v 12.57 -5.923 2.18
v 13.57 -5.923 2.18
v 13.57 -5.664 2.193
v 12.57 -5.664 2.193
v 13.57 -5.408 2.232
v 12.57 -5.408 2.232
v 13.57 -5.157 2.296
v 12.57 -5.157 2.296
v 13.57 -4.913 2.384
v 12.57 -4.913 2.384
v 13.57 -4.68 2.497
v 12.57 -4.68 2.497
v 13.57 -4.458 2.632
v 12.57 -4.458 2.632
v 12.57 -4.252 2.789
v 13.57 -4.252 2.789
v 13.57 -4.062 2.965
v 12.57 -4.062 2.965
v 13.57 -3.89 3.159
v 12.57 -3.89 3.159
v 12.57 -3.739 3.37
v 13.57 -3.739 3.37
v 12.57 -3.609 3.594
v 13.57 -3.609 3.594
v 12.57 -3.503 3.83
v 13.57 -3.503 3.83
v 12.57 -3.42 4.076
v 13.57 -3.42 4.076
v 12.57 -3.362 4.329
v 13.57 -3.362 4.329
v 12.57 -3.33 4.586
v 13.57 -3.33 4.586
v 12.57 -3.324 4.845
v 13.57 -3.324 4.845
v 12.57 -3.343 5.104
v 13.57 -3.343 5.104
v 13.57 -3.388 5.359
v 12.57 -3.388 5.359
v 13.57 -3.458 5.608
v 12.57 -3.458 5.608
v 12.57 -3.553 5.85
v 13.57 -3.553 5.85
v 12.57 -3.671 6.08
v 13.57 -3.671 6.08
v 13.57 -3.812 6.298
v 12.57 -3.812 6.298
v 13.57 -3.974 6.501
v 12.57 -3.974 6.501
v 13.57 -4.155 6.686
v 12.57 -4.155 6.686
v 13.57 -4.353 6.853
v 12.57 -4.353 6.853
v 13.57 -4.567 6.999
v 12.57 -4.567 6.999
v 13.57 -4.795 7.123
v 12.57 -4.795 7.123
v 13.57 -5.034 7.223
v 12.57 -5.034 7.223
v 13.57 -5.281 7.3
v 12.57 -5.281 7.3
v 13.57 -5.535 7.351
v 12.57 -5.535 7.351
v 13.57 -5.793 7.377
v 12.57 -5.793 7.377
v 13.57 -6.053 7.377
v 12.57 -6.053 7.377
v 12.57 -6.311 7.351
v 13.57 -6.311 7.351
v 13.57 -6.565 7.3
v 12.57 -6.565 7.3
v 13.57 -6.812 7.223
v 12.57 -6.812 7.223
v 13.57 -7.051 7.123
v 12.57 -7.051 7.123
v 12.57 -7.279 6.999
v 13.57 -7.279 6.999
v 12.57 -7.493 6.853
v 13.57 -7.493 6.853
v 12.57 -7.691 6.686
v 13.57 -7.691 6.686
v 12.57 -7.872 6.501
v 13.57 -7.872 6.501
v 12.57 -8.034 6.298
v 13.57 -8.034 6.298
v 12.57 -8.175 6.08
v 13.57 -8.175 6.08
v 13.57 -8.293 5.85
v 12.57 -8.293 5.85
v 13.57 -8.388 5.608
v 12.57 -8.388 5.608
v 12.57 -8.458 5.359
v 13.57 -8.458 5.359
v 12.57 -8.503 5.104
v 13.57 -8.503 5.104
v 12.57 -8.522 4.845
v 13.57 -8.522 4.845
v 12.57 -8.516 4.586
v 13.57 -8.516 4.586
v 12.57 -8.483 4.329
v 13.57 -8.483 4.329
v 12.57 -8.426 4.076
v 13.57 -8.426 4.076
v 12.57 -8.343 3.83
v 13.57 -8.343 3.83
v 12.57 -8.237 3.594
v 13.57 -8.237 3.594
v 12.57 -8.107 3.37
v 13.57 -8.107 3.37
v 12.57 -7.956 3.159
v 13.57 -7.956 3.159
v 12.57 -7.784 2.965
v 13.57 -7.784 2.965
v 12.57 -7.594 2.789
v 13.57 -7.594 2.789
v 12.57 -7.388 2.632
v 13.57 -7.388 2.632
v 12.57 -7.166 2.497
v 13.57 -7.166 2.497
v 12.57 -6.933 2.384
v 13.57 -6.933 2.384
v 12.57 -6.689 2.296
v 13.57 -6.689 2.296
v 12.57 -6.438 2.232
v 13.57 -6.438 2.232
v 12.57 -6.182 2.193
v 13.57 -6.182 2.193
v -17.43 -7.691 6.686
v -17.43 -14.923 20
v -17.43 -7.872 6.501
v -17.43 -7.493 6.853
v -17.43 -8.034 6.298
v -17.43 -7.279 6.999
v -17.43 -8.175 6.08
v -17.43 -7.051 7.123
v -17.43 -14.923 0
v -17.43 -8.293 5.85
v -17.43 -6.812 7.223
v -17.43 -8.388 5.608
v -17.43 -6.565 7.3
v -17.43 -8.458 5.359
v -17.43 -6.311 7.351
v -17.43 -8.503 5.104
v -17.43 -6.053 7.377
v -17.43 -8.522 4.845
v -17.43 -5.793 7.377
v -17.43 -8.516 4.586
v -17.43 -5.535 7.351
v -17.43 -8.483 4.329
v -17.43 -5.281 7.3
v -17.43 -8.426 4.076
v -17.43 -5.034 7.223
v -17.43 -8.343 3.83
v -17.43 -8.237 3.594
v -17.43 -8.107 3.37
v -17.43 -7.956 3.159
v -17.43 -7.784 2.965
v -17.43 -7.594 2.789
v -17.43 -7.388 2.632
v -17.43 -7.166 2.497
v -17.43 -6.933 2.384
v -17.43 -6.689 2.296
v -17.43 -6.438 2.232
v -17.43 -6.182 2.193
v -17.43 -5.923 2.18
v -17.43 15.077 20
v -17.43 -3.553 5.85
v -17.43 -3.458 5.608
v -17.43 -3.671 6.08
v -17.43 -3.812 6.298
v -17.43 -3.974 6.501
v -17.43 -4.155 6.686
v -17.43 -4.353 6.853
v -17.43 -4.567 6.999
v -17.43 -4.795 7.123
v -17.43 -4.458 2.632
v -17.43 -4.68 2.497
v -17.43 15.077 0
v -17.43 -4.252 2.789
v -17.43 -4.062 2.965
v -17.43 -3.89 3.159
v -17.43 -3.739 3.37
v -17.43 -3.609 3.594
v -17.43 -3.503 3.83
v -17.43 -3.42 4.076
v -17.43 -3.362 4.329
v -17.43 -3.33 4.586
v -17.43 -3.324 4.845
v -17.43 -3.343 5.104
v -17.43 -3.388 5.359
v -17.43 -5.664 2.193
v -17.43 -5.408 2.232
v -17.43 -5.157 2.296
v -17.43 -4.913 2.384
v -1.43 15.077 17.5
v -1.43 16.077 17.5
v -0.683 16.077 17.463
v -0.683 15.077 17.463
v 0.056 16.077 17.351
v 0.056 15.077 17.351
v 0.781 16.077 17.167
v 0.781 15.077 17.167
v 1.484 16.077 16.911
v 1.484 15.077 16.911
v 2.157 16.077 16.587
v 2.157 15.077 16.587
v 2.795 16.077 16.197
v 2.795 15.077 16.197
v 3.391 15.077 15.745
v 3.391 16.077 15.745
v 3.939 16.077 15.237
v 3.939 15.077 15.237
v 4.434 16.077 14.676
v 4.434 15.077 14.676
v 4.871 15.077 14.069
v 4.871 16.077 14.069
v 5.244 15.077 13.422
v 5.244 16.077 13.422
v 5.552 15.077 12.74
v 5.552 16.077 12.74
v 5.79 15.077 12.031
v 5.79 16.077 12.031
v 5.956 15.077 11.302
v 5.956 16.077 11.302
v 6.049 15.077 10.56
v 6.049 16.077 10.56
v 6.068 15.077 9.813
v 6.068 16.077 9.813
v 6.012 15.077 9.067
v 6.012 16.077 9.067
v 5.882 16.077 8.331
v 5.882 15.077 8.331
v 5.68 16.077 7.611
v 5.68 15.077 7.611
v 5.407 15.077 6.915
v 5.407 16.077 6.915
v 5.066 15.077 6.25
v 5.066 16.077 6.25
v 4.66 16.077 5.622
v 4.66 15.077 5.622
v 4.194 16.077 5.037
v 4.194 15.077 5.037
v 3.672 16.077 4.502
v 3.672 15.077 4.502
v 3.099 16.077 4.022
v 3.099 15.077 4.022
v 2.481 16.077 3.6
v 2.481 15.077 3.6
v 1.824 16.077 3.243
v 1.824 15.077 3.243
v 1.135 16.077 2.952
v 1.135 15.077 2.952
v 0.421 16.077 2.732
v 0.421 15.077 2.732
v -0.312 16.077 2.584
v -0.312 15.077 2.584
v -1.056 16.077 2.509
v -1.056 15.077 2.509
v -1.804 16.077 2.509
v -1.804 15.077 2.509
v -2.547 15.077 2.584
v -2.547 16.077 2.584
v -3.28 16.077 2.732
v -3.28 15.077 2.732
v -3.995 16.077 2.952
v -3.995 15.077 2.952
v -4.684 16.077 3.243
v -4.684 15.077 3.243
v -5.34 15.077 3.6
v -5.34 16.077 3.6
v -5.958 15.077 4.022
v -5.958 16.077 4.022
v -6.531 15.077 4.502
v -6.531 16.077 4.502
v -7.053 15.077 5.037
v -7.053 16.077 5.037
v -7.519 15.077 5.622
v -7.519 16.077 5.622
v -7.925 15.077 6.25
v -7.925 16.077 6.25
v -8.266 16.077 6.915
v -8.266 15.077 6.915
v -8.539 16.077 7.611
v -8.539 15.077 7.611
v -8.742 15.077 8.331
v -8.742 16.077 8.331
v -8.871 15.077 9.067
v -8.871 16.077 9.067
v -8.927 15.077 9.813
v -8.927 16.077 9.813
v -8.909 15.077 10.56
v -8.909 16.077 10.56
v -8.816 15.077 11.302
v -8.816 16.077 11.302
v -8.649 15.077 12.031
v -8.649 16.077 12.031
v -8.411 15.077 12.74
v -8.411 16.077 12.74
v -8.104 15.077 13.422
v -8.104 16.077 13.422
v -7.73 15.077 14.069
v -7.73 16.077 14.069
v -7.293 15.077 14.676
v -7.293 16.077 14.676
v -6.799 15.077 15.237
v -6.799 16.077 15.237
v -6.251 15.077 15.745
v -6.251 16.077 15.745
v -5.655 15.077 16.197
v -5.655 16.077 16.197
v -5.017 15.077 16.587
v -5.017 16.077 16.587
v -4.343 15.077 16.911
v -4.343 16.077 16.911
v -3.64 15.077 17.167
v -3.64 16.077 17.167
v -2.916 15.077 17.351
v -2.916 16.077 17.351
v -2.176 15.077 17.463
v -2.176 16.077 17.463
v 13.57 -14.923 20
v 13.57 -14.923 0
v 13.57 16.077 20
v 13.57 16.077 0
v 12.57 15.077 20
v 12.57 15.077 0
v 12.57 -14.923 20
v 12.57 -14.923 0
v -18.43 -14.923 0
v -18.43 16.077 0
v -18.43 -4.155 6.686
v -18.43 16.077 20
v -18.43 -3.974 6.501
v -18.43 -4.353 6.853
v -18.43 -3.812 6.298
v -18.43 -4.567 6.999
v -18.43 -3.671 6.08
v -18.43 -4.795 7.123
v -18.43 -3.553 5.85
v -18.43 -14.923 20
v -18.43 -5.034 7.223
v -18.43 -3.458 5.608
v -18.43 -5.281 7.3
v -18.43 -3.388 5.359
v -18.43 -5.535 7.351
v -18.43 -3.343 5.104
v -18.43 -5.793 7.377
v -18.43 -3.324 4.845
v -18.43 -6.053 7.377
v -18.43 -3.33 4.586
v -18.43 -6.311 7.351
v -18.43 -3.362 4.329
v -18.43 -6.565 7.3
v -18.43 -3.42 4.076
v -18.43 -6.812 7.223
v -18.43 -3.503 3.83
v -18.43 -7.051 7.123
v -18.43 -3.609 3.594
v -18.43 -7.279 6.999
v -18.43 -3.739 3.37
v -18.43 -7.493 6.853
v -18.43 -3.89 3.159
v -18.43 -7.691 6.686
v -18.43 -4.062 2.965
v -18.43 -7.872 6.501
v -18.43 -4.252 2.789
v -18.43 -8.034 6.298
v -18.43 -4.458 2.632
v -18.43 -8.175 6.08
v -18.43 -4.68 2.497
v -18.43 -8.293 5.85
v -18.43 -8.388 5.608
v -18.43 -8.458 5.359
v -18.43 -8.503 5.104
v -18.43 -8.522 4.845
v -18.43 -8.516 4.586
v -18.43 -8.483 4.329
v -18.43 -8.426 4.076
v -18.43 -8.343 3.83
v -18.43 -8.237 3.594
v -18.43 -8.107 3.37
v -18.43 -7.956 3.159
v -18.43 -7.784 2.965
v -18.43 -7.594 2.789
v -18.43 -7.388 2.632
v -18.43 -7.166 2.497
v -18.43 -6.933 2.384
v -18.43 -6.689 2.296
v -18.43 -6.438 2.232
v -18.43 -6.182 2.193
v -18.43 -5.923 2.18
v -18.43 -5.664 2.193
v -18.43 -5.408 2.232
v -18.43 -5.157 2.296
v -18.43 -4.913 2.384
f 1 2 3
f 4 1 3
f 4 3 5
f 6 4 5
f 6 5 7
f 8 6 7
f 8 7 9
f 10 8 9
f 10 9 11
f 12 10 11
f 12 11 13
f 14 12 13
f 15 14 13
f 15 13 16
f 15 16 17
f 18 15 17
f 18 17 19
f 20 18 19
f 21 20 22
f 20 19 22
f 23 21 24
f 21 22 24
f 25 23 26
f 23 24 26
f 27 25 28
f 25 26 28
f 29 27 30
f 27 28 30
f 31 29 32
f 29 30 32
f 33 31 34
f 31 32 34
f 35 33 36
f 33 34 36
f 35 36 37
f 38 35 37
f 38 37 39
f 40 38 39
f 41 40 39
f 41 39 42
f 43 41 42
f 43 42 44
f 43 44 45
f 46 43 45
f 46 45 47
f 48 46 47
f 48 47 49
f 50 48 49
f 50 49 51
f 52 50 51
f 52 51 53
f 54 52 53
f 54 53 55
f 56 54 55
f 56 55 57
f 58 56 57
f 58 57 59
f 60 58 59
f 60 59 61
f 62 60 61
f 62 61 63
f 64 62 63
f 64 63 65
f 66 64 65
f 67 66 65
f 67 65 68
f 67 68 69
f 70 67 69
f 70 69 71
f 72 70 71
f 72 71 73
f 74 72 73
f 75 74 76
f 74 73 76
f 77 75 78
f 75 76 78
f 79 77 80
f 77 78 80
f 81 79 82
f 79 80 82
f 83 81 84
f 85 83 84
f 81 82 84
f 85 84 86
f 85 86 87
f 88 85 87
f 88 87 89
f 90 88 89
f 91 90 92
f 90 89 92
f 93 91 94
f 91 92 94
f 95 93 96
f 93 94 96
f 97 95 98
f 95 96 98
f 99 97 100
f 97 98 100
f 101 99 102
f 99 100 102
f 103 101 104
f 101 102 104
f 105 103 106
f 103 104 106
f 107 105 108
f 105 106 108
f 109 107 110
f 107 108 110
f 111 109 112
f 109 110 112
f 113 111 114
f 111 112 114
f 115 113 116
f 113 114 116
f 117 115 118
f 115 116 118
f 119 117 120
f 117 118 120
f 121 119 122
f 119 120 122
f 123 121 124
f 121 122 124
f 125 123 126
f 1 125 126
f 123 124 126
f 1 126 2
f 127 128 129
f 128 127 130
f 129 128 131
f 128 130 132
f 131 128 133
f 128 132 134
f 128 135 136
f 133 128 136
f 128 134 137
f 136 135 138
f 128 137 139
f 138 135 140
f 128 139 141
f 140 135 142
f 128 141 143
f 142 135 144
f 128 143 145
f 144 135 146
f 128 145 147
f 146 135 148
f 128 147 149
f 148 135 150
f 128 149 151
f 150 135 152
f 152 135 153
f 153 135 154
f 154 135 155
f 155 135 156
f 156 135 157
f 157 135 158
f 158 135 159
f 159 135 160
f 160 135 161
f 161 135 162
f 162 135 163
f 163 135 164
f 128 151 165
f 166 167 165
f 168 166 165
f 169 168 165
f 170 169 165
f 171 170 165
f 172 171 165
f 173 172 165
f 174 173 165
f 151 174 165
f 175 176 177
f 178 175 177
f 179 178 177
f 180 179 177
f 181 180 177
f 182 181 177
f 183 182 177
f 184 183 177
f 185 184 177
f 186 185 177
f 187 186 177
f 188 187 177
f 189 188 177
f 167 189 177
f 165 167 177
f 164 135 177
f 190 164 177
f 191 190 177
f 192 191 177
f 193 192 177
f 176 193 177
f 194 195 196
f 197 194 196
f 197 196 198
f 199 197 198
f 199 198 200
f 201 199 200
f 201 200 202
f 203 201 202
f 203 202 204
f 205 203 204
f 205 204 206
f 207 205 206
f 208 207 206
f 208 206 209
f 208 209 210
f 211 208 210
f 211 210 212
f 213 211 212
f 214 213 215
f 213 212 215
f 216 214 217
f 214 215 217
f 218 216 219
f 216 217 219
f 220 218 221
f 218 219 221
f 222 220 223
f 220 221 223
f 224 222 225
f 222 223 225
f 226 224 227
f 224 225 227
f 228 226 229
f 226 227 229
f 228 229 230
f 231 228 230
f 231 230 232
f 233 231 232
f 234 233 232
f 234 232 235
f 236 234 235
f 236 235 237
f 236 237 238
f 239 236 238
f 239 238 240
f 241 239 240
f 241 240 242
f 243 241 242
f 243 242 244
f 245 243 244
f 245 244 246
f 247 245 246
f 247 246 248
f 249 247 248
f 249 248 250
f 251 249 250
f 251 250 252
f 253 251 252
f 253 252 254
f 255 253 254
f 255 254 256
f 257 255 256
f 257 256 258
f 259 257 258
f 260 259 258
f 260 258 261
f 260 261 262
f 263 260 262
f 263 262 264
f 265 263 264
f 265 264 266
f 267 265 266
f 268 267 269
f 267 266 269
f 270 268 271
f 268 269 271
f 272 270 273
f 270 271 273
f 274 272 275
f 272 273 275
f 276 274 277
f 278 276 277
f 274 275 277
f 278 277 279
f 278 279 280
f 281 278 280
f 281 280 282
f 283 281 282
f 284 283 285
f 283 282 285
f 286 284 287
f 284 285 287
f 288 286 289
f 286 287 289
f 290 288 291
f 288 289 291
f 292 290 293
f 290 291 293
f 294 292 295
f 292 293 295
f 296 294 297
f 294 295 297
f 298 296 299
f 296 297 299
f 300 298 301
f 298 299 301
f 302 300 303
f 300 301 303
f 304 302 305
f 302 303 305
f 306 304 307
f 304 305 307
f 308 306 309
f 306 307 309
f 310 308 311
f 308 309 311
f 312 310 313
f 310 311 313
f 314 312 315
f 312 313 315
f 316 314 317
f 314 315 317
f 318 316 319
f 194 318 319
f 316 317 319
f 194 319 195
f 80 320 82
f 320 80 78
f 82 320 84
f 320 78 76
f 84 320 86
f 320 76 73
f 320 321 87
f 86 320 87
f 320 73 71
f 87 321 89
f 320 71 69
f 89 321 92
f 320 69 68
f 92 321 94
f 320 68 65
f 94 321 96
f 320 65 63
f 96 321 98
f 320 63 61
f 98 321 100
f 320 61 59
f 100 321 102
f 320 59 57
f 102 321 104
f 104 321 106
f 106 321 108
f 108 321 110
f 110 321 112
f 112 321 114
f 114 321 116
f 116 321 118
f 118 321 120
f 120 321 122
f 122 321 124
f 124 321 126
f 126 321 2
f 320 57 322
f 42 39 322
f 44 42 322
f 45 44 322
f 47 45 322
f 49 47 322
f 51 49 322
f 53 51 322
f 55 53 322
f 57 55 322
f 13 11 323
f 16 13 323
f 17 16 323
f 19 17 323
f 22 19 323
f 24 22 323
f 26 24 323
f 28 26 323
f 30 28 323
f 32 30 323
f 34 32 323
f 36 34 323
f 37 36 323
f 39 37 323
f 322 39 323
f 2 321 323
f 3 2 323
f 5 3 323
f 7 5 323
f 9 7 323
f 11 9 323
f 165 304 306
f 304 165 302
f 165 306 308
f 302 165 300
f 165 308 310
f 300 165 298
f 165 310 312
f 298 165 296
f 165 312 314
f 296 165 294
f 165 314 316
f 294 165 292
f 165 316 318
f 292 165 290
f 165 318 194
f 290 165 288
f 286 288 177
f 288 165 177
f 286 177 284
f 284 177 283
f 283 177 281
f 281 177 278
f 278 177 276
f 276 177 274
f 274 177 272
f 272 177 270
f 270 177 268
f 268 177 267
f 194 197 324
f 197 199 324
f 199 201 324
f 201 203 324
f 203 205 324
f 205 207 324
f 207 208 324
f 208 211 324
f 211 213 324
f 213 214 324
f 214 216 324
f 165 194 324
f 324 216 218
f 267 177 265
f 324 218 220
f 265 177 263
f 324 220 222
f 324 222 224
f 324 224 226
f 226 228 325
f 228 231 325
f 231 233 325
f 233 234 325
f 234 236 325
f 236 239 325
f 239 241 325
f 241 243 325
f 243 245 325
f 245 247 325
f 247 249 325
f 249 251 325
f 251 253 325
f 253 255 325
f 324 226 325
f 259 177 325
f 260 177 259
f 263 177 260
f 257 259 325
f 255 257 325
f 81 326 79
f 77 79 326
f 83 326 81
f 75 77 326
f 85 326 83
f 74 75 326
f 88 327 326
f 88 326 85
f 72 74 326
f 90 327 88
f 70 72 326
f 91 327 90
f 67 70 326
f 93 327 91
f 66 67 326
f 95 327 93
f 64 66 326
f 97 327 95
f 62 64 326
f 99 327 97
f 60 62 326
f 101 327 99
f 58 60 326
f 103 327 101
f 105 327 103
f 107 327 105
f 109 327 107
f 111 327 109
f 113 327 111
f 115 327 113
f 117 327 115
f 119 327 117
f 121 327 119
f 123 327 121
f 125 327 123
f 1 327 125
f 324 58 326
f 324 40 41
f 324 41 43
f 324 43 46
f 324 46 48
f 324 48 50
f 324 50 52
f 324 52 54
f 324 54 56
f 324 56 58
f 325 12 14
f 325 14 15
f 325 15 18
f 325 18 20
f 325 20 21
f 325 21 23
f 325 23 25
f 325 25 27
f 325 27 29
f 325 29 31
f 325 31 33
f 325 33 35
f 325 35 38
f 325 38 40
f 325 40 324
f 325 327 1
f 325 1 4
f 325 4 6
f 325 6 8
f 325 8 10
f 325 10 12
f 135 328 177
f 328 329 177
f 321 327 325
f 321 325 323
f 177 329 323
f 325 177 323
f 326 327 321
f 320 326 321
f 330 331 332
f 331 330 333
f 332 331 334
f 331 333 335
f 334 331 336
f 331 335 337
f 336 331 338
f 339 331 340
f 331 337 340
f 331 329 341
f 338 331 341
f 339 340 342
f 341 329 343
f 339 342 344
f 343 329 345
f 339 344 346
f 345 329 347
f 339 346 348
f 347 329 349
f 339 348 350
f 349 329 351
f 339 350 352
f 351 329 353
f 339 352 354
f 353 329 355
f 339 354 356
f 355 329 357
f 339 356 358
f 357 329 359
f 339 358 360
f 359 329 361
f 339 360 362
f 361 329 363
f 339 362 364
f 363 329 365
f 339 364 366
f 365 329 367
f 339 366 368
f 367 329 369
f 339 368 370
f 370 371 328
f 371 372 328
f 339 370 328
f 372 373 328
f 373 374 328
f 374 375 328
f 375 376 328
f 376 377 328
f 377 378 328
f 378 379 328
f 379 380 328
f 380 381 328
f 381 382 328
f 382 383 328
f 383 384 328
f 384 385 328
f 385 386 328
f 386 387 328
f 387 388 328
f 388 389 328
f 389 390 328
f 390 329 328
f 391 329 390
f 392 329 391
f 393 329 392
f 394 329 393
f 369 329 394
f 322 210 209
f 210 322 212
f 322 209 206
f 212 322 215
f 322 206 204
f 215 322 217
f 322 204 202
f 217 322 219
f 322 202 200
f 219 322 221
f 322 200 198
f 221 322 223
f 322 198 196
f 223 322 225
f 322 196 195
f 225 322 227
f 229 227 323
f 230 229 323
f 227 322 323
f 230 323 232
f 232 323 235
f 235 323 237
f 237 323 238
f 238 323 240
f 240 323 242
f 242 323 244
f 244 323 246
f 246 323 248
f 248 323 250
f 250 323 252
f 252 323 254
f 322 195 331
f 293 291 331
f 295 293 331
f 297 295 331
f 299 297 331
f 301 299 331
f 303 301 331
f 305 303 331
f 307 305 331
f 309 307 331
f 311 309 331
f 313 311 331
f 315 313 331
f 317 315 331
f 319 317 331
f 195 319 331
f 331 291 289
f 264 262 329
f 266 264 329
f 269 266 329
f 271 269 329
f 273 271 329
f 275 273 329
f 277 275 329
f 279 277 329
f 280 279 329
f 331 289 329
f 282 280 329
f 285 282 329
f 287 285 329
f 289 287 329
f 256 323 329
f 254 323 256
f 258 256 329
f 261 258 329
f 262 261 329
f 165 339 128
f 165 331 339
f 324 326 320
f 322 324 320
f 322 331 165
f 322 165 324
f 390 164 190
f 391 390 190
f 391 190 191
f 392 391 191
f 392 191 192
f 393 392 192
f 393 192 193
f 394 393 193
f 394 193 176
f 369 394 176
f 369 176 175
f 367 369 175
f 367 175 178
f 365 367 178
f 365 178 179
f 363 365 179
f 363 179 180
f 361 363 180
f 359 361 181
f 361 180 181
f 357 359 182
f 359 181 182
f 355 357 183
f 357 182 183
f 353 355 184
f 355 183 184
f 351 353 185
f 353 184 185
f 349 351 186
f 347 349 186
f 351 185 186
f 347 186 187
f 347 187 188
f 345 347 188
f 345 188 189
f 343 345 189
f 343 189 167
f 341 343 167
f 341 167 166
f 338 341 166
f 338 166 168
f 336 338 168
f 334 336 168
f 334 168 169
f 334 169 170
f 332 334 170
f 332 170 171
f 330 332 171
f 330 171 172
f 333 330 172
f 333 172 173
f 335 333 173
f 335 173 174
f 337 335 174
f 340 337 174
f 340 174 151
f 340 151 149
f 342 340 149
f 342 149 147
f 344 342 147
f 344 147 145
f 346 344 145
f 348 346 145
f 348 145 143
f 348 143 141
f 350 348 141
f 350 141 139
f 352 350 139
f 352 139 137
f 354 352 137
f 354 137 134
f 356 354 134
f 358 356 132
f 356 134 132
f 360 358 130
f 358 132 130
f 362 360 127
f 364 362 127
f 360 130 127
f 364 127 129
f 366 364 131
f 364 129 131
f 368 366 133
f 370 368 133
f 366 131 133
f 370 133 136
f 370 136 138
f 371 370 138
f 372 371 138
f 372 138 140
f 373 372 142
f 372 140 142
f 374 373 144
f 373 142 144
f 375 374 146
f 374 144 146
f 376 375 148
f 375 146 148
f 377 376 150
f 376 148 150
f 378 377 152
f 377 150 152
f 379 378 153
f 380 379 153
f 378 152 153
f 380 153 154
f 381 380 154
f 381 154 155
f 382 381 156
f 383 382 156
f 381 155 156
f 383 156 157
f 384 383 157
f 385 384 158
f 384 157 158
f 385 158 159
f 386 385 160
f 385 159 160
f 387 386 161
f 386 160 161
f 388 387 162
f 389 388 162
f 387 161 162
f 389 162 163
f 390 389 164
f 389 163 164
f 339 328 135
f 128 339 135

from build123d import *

# Parameters (mm, degrees)
SKETCH10_W          = 1
SKETCH10_H          = 30
BOSS_EXTRUDE1_DEPTH = 20
SKETCH11_R          = 2.6
CUT_EXTRUDE1_DEPTH  = 42.01792231
SKETCH12_R          = 7.5
CUT_EXTRUDE2_DEPTH  = 42.238966794


with BuildPart() as part:
    # Sketch10 → Boss-Extrude1 (new body)
    with BuildSketch(Plane.XY):
        with Locations((-17.929660394, 0.077000672)):
            Rectangle(SKETCH10_W, SKETCH10_H)
        with Locations((13.070339606, 0.077000672)):
            Rectangle(SKETCH10_W, SKETCH10_H)
        Polygon((-18.429660394, 16.077000672), (-18.429660394, 15.077000672), (-17.429660394, 15.077000672), (12.570339606, 15.077000672), (13.570339606, 15.077000672), (13.570339606, 16.077000672), align=None)
    extrude(amount=BOSS_EXTRUDE1_DEPTH)

    # Sketch11 → Cut-Extrude1 (cut, through all)
    with BuildSketch(Plane(origin=(13.570339606, 0, 0), x_dir=(0, 0, -1), z_dir=(1, 0, 0))):
        with Locations((-4.780263521, -5.922999328)):
            Circle(SKETCH11_R)
    extrude(amount=-CUT_EXTRUDE1_DEPTH, mode=Mode.SUBTRACT)

    # Sketch12 → Cut-Extrude2 (cut, through all)
    with BuildSketch(Plane(origin=(0, 16.077000672, 0), x_dir=(1, 0, 0), z_dir=(0, 1, 0))):
        with Locations(Location((-1.429660394, -10, 0), (0, 0, 270))):
            Circle(SKETCH12_R)
    extrude(amount=-CUT_EXTRUDE2_DEPTH, mode=Mode.SUBTRACT)


solid = part.part
